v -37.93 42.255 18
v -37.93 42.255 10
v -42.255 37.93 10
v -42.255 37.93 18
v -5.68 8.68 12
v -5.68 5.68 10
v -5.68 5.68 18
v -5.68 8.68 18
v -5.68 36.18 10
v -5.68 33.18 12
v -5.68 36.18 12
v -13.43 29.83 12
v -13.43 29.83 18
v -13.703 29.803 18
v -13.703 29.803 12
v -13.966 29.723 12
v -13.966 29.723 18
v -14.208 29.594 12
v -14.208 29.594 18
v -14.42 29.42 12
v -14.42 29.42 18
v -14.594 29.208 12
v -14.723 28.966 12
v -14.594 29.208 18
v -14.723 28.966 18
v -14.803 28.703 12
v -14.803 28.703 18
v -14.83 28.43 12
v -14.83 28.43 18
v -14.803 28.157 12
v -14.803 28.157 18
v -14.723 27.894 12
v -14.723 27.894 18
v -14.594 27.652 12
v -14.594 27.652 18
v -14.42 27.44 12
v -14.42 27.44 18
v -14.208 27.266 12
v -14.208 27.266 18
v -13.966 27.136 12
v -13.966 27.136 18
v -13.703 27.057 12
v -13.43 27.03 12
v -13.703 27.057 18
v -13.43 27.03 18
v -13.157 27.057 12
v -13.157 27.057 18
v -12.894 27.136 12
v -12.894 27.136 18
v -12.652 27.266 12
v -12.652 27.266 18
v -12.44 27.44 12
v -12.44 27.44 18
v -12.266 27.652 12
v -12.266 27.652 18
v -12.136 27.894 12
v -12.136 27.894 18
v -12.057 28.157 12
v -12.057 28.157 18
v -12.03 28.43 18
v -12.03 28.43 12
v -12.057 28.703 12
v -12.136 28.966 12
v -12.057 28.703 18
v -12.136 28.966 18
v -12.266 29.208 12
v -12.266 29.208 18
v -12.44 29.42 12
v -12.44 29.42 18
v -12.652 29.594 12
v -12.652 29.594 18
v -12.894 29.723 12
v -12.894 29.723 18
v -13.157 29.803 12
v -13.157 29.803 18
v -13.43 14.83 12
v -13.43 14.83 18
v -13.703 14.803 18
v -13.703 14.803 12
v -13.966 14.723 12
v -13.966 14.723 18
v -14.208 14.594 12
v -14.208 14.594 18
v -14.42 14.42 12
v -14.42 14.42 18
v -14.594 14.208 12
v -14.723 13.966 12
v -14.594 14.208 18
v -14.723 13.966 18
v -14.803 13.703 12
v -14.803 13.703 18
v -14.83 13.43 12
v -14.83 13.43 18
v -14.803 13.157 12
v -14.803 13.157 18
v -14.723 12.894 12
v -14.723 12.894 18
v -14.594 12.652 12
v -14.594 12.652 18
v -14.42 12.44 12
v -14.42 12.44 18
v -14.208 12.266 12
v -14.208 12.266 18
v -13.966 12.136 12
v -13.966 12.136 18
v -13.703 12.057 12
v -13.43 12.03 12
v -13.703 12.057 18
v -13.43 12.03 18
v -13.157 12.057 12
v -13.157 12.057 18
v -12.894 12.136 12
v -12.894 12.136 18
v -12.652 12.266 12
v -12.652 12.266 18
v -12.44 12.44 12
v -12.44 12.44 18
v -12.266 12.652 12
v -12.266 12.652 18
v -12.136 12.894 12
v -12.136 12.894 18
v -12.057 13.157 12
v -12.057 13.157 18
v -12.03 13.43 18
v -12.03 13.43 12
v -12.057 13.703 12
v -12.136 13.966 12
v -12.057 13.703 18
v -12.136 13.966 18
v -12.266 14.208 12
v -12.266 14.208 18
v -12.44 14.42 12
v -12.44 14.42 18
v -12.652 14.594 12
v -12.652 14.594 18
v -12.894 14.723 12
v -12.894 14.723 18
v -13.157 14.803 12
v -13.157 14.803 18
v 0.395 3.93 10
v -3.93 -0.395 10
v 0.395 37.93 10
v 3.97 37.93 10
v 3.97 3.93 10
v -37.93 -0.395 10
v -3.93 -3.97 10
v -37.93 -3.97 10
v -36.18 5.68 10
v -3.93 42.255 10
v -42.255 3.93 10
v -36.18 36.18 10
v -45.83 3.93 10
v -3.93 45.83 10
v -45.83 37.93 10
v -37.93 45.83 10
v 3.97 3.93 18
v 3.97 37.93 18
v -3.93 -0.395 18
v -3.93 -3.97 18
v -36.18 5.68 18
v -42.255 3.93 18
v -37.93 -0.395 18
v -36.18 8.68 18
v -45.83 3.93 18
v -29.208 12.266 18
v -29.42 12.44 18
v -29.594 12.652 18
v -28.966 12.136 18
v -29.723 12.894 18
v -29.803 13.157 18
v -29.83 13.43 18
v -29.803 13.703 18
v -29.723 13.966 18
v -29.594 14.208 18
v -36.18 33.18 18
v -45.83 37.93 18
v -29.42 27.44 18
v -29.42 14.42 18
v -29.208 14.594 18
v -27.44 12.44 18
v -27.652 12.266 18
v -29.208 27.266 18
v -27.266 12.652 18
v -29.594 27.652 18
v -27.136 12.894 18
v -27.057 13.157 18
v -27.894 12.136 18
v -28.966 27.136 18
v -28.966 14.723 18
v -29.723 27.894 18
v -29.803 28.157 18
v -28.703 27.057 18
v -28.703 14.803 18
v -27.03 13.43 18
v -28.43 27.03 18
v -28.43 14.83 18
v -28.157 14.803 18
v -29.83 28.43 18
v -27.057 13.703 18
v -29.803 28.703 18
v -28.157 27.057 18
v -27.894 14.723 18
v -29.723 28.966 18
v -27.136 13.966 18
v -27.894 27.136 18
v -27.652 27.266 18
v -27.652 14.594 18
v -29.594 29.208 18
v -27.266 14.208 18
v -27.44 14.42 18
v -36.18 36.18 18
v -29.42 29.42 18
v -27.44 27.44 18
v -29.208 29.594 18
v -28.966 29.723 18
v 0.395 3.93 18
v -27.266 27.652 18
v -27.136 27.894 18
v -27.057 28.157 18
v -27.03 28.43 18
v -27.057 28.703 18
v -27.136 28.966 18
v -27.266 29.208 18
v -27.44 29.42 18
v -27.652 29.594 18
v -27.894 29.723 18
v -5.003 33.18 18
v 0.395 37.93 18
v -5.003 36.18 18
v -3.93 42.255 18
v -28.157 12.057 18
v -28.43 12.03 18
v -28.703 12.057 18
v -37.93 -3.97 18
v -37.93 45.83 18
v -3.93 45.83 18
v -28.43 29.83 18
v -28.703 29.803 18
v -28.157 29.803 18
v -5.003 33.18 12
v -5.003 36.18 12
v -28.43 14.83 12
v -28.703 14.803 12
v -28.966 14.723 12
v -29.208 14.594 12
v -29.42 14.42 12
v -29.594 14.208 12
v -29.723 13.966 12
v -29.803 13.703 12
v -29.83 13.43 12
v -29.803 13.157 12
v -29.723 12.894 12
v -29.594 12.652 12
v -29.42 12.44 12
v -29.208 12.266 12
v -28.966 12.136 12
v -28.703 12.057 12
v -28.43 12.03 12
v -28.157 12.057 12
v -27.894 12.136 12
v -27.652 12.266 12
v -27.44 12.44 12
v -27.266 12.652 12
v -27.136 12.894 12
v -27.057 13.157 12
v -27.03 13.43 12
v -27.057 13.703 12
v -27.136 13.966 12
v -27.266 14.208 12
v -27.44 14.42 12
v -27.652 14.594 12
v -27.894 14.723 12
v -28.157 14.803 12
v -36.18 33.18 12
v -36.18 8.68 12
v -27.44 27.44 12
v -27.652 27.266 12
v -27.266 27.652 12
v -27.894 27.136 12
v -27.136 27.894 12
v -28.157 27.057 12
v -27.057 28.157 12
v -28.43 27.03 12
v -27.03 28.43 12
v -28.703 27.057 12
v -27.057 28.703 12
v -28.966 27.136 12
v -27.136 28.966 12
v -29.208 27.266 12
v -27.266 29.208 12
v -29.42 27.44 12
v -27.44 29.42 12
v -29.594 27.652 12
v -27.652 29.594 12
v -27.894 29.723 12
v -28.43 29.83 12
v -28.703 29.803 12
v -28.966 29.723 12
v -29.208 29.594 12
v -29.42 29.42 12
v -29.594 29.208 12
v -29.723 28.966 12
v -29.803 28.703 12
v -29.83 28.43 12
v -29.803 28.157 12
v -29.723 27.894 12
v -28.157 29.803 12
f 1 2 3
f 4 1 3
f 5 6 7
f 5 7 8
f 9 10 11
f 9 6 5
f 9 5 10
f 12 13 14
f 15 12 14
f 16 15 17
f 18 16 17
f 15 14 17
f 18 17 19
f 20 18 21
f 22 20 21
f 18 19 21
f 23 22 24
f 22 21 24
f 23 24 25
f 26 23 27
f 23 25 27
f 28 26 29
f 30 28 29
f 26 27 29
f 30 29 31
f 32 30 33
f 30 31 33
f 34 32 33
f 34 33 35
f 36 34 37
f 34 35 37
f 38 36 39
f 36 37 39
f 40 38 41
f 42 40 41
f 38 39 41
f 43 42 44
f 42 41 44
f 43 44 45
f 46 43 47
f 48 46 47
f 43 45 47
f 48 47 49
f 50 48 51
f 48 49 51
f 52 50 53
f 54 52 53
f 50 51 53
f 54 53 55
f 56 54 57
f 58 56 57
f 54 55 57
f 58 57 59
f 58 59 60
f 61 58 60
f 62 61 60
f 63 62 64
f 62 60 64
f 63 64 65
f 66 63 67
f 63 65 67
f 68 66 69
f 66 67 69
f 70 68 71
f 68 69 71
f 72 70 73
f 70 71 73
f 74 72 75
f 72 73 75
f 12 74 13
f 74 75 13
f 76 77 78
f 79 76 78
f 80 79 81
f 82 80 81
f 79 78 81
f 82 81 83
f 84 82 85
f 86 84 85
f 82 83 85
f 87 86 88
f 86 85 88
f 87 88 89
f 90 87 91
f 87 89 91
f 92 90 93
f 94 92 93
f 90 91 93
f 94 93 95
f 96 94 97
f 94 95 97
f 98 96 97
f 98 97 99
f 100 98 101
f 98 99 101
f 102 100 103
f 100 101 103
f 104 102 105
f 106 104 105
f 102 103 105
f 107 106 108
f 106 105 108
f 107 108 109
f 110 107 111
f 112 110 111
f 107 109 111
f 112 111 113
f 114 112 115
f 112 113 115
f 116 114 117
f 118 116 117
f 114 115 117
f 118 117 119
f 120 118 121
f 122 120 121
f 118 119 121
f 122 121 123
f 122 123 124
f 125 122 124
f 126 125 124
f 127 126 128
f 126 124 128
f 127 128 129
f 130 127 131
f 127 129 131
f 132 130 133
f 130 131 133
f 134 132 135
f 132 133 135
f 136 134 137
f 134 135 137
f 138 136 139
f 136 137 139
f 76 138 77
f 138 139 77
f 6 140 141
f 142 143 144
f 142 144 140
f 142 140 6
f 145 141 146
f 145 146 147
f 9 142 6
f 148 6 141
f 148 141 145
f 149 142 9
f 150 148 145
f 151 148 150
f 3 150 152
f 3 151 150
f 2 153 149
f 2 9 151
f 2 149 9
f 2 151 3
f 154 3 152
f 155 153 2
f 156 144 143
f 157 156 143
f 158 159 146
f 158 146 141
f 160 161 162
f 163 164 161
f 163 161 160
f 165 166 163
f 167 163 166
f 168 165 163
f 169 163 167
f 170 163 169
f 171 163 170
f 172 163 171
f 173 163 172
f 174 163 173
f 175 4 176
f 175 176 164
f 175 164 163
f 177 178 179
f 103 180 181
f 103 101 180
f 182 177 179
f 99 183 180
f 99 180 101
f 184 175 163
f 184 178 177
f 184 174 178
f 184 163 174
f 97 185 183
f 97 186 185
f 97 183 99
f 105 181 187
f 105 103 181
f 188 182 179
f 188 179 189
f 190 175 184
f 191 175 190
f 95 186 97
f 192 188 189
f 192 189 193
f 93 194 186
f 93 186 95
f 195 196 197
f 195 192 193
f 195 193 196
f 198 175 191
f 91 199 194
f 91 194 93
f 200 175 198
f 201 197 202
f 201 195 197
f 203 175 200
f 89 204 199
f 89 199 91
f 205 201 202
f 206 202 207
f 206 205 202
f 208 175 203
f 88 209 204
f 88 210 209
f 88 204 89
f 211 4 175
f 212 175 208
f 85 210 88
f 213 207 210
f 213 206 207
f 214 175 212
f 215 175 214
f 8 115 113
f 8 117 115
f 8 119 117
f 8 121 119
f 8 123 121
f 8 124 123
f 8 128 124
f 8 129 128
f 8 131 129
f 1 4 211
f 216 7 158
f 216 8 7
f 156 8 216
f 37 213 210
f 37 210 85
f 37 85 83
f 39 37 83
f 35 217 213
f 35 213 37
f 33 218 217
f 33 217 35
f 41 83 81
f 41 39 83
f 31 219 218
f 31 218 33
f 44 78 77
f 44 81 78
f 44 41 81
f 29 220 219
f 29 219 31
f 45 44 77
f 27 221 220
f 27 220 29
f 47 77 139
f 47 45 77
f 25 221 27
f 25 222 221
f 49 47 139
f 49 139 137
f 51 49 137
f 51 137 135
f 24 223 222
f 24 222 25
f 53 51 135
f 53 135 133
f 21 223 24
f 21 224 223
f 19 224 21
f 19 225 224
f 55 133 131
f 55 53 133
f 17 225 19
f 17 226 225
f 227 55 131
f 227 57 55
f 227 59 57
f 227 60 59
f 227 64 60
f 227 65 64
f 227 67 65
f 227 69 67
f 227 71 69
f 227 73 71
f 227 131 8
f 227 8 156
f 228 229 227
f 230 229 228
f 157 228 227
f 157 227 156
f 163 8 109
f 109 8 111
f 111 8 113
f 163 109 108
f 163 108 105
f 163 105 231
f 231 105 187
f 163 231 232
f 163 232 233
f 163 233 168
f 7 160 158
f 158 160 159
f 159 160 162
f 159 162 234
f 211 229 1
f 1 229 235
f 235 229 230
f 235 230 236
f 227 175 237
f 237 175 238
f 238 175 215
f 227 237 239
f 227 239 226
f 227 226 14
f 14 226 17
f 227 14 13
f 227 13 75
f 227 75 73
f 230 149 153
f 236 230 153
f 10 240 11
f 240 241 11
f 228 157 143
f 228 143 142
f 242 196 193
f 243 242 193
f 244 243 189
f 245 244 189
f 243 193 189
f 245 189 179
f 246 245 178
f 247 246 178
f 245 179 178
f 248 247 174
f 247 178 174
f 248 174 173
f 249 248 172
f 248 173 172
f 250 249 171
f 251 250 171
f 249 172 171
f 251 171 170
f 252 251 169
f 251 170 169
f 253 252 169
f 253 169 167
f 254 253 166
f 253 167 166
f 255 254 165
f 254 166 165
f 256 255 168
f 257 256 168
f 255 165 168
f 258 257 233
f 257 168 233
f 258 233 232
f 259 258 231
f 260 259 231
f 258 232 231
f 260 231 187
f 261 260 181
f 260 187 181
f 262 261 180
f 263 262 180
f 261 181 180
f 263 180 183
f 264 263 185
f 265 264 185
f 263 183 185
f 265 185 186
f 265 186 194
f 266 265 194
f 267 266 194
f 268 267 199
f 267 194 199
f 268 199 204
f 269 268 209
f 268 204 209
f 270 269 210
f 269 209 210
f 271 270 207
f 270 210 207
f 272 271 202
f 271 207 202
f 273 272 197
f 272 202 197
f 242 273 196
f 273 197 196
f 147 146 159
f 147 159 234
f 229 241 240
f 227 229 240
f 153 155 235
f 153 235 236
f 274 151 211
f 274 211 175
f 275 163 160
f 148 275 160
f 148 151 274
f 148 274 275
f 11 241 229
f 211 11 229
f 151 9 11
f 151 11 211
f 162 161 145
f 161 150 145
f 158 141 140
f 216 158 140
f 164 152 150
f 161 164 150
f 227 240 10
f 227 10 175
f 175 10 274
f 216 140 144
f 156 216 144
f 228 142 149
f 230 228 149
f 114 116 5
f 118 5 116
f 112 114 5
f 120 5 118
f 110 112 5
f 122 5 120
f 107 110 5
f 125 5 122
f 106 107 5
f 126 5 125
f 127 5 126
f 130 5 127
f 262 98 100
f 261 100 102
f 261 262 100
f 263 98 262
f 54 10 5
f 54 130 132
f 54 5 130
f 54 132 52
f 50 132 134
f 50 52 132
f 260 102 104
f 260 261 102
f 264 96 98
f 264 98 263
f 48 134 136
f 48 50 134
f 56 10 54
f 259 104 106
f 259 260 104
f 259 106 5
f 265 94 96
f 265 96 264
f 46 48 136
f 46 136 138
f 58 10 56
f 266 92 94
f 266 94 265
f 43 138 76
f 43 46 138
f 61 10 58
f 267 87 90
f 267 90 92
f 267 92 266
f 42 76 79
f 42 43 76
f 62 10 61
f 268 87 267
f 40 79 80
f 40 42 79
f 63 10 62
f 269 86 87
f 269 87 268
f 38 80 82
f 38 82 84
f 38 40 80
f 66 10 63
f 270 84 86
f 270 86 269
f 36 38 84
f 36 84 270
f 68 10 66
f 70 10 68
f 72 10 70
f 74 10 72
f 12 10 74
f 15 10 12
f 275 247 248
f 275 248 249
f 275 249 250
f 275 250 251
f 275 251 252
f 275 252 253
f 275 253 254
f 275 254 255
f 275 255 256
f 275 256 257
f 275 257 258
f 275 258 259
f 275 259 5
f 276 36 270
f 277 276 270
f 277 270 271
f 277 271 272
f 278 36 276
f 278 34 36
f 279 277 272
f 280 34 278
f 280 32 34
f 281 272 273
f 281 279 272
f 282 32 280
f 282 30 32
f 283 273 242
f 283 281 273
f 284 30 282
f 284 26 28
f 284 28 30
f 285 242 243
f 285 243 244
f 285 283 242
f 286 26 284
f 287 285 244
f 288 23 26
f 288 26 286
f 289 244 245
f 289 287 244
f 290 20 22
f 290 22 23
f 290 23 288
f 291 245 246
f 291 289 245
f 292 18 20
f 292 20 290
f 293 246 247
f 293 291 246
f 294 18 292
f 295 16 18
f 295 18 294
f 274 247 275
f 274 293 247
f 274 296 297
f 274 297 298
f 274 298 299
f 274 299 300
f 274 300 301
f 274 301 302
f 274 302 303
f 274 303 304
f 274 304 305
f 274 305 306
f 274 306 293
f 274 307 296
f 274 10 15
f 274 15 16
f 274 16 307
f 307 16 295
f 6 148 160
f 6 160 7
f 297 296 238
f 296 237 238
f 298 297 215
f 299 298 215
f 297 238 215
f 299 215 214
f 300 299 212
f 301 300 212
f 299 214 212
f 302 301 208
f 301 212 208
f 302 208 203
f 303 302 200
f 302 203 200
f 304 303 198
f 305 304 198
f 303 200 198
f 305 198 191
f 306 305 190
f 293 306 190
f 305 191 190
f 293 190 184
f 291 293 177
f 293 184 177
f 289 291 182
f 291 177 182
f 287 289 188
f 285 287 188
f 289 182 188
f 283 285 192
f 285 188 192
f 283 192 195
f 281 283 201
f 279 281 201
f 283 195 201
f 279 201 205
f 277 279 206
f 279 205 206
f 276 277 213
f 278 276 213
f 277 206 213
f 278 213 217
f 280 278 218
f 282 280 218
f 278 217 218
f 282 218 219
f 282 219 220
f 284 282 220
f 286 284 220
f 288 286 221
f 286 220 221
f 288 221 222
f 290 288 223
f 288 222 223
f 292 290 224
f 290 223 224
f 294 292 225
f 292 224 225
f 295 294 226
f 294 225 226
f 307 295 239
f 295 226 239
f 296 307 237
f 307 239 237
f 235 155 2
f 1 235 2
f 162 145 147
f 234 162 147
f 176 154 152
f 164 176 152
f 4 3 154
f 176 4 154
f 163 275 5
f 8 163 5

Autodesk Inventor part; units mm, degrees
ref_plane "YZ Plane" through (0, 0, 0) normal (1, 0, 0) x (0, 1, 0)
ref_plane "XZ Plane" through (0, 0, 0) normal (0, 1, 0) x (-1, 0, 0)
ref_plane "Work Plane1" through (0, 0, 10) normal (0, 0, 1) x (1, 0, 0)
sketch "Sketch1" plane through (0, 0, 10) normal (0, 0, 1) x (1, 0, 0)
  line L0 (-4.0299, -0.3538) -> (-2.2322, 1.4439) construction
  arc A0 (-1.4439, 2.2322) -> (-2.2322, 1.4439) centre (-0.9299, 0.9299) ccw construction
  line L1 (-1.4439, 2.2322) -> (0.3538, 4.0299) construction
  line L2 (-37.8299, 42.2137) -> (-37.8299, 45.8299) construction
  line L3 (-37.8299, 45.8299) -> (-4.0299, 45.8299) construction
  line L4 (-4.0299, 45.8299) -> (-4.0299, 42.2137) construction
  line L5 (-4.0299, 4.0299) -> (0.3538, 4.0299) projected
  circle A1 centre (-20.9299, 20.9299) radius 17.5 construction
  line L6 (-20.9299, 58.9723) -> (17.1124, 20.9299) construction
  line L7 (17.1124, 20.9299) -> (-20.9299, -17.1124) construction
  line L8 (-20.9299, -17.1124) -> (-58.9723, 20.9299) construction
  line L9 (-58.9723, 20.9299) -> (-20.9299, 58.9723) construction
  line L10 (-20.9299, 58.9723) -> (-20.9299, -17.1124) construction
  line L11 (17.1124, 20.9299) -> (-58.9723, 20.9299) construction
  line L12 (-20.9299, 58.9723) -> (32.8701, 58.9723) construction
  line L13 (-43.2198, 43.4299) -> (1.7802, 43.4299) construction
  line L14 (1.7802, 43.4299) -> (1.7802, -1.5701) construction
  line L15 (1.7802, -1.5701) -> (-43.2198, -1.5701) construction
  line L16 (-43.2198, -1.5701) -> (-43.2198, 43.4299) construction
  line L17 (-43.2198, 5.1774) -> (-43.2198, 36.6824)
  line L18 (-43.2198, 36.6824) -> (-36.4723, 43.4299)
  line L19 (-36.4723, 43.4299) -> (-5.3876, 43.4299)
  line L20 (-5.3876, 43.4299) -> (1.7802, 36.2621)
  line L21 (1.7802, 36.2621) -> (1.7802, 5.5977)
  line L22 (1.7802, 5.5977) -> (-5.3876, -1.5701)
  line L23 (-5.3876, -1.5701) -> (-36.4723, -1.5701)
  line L24 (-36.4723, -1.5701) -> (-43.2198, 5.1774)
  line L25 (-4.0299, 42.2137) -> (-37.8299, 42.2137) projected
  line L26 (-4.0299, -0.3538) -> (-4.0299, 4.0299) projected
  line L27 (-43.2198, 43.4299) -> (-10.4667, 10.6769) construction
  line L28 (-8.5595, 8.5517) -> (1.7802, -1.5701) construction
  line L29 (1.7802, 43.4299) -> (-25.699, 15.9507) construction
  line L30 (-30.9728, 10.6769) -> (-43.2198, -1.5701) construction
  point P0 (-37.8299, 4.0299)
  dimension "d18" = 53.8
  dimension "d19" = 45
  dimension "d20" = 53.8
  dimension "d21" = 45
  dimension "d22" = 45
extrude "Extrusion1" add sketch "Sketch1" along normal blind 8
sketch "Sketch3" plane through (0, 0, 10) normal (0, 0, -1) x (-1, 0, 0)
  line L0 (37.8299, -0.4701) -> (37.8299, 4.0299) construction
  line L1 (4.0299, 4.0299) -> (4.0299, -0.4701) construction
  line L2 (37.8299, -0.4701) -> (37.8299, 1.1886) construction
  line L3 (4.0299, -3.9701) -> (4.0299, -0.3538) construction
  line L4 (45.8299, 4.0299) -> (42.2137, 4.0299) construction
  line L5 (-0.3538, 4.0299) -> (-3.9701, 4.0299) construction
  line L6 (-3.9701, 37.8299) -> (-0.3538, 37.8299) construction
  line L7 (4.0299, 42.2137) -> (4.0299, 45.8299) construction
  line L8 (37.8299, 45.8299) -> (37.8299, 42.2137) construction
  line L9 (42.2137, 37.8299) -> (45.8299, 37.8299) construction
  line L10 (37.8299, 37.7299) -> (45.8299, 37.7299)
  line L11 (45.8299, 37.7299) -> (45.8299, 4.1299)
  line L12 (45.8299, 4.1299) -> (37.8299, 4.1299)
  line L13 (37.8299, 4.1299) -> (37.8299, 37.7299)
  line L14 (37.7299, 4.0299) -> (4.1299, 4.0299)
  line L15 (4.1299, 4.0299) -> (4.1299, -3.9701)
  line L16 (4.1299, -3.9701) -> (37.7299, -3.9701)
  line L17 (37.7299, -3.9701) -> (37.7299, 4.0299)
  line L18 (4.0299, 4.1299) -> (-3.9701, 4.1299)
  line L19 (-3.9701, 4.1299) -> (-3.9701, 37.7299)
  line L20 (-3.9701, 37.7299) -> (4.0299, 37.7299)
  line L21 (4.0299, 37.7299) -> (4.0299, 4.1299)
  line L22 (4.1299, 37.8299) -> (37.7299, 37.8299)
  line L23 (37.7299, 37.8299) -> (37.7299, 45.8299)
  line L24 (37.7299, 45.8299) -> (4.1299, 45.8299)
  line L25 (4.1299, 45.8299) -> (4.1299, 37.8299)
  point P0 (0, 0)
  dimension "d23" = 0.1
  dimension "d24" = 0.1
  dimension "d25" = 0.1
  dimension "d26" = 0.1
  dimension "d27" = 0.1
extrude "Extrusion3" add sketch "Sketch3" against normal up to surface (8 mm away)
sketch "Skizze12" plane through (0, 0, 10) normal (0, 0, -1) x (-1, 0, 0)
  line L0 (-0.3124, 4.1299) -> (4.1299, -0.3124) projected
  line L1 (4.1299, -0.3124) -> (4.1299, -3.9701) projected
  line L2 (4.1299, -3.9701) -> (37.7299, -3.9701) construction
  line L3 (37.7299, -3.9701) -> (37.7299, -0.3124) projected
  line L4 (37.7299, -0.3124) -> (42.1723, 4.1299) projected
  line L5 (45.8299, 4.1299) -> (42.1723, 4.1299) projected
  line L6 (45.8299, 37.7299) -> (45.8299, 4.1299) construction
  line L7 (42.1723, 37.7299) -> (45.8299, 37.7299) projected
  line L8 (42.1723, 37.7299) -> (37.7299, 42.1723) projected
  line L9 (37.7299, 42.1723) -> (37.7299, 45.8299) projected
  line L10 (37.7299, 45.8299) -> (4.1299, 45.8299) construction
  line L11 (4.1299, 45.8299) -> (4.1299, 42.1723) projected
  line L12 (4.1299, 42.1723) -> (-0.3124, 37.7299) projected
  line L13 (-3.9701, 37.7299) -> (-0.3124, 37.7299) projected
  line L14 (-3.9701, 4.1299) -> (-3.9701, 37.7299) construction
  line L15 (-0.3124, 4.1299) -> (-3.9701, 4.1299) projected
  line L16 (37.9299, -4.1701) -> (3.9299, -4.1701) construction
  line L17 (3.9299, -4.1701) -> (3.9299, -0.3953)
  line L18 (3.9299, -0.3953) -> (-0.3953, 3.9299)
  line L19 (-0.3953, 3.9299) -> (-4.1701, 3.9299)
  line L20 (-4.1701, 3.9299) -> (-4.1701, 37.9299) construction
  line L21 (-4.1701, 37.9299) -> (-0.3953, 37.9299)
  line L22 (-0.3953, 37.9299) -> (3.9299, 42.2551)
  line L23 (3.9299, 42.2551) -> (3.9299, 46.0299)
  line L24 (3.9299, 46.0299) -> (37.9299, 46.0299) construction
  line L25 (37.9299, 46.0299) -> (37.9299, 42.2551)
  line L26 (37.9299, 42.2551) -> (42.2551, 37.9299)
  line L27 (42.2551, 37.9299) -> (46.0299, 37.9299)
  line L28 (46.0299, 37.9299) -> (46.0299, 3.9299) construction
  line L29 (46.0299, 3.9299) -> (42.2551, 3.9299)
  line L30 (42.2551, 3.9299) -> (37.9299, -0.3953)
  line L31 (37.9299, -0.3953) -> (37.9299, -4.1701)
  line L32 (-3.9701, 37.7299) -> (-3.9701, 37.9299)
  line L33 (37.7299, 45.8299) -> (4.1299, 45.8299) projected
  line L34 (4.1299, 45.8299) -> (3.9299, 45.8299)
  line L35 (37.7299, 45.8299) -> (37.9299, 45.8299)
  line L36 (45.8299, 37.7299) -> (45.8299, 37.9299)
  line L37 (45.8299, 4.1299) -> (45.8299, 3.9299)
  line L38 (37.7299, -3.9701) -> (37.9299, -3.9701)
  line L39 (4.1299, -3.9701) -> (3.9299, -3.9701)
  line L40 (-3.9701, 4.1299) -> (-3.9701, 3.9299)
  point P0 (0, 0)
  dimension "d65" = 0.2
extrude "IM_offset" add sketch "Skizze12" against normal up to surface (8 mm away)
sketch "Sketch15" plane through (0, 0, 10) normal (0, 0, -1) x (-1, 0, 0)
  line L0 (-3.9701, 3.9299) -> (-3.9701, 37.9299) projected
  line L1 (-0.3953, 3.9299) -> (-3.9701, 3.9299) projected
  line L2 (3.9299, -0.3953) -> (-0.3953, 3.9299) projected
  line L3 (3.9299, -3.9701) -> (3.9299, -0.3953) projected
  line L4 (3.9299, -3.9701) -> (37.9299, -3.9701) projected
  line L5 (37.9299, -0.3953) -> (37.9299, -3.9701) projected
  line L6 (42.2551, 3.9299) -> (37.9299, -0.3953) projected
  line L7 (45.8299, 3.9299) -> (42.2551, 3.9299) projected
  line L8 (45.8299, 3.9299) -> (45.8299, 37.9299) projected
  line L9 (45.8299, 37.9299) -> (42.2551, 37.9299) projected
  line L10 (42.2551, 37.9299) -> (37.9299, 42.2551) projected
  line L11 (37.9299, 42.2551) -> (37.9299, 45.8299) projected
  line L12 (37.9299, 45.8299) -> (3.9299, 45.8299) projected
  line L13 (3.9299, 45.8299) -> (3.9299, 42.2551) projected
  line L14 (3.9299, 42.2551) -> (-0.3953, 37.9299) projected
  line L15 (-0.3953, 37.9299) -> (-3.9701, 37.9299) projected
  line L16 (36.1799, 36.1799) -> (5.6799, 36.1799)
  line L17 (5.6799, 36.1799) -> (5.6799, 5.6799)
  line L18 (5.6799, 5.6799) -> (36.1799, 5.6799)
  line L19 (36.1799, 5.6799) -> (36.1799, 36.1799)
  line L20 (36.1799, 36.1799) -> (5.6799, 5.6799) construction
  line L21 (5.6799, 36.1799) -> (36.1799, 5.6799) construction
  point P0 (0, 0)
  point P1 (20.9299, 20.9299)
  dimension "d73" = 30.5
  dimension "d74" = 30.5
extrude "Extrusion13" cut sketch "Sketch15" against normal blind 2 contours L19 L18 L17 L16
sketch "Sketch16" plane through (0, 0, 12) normal (0, 0, -1) x (-1, 0, 0)
  line L0 (5.6799, 36.1799) -> (36.1799, 36.1799) projected
  line L1 (5.6799, 5.6799) -> (5.6799, 36.1799) projected
  line L2 (36.1799, 5.6799) -> (5.6799, 5.6799) projected
  line L3 (36.1799, 36.1799) -> (36.1799, 5.6799) projected
  line L4 (5.6799, 5.6799) -> (5.6799, 36.1799) projected
  line L5 (36.1799, 36.1799) -> (36.1799, 5.6799) projected
  line L6 (5.6799, 5.6799) -> (36.1799, 5.6799)
  line L7 (36.1799, 5.6799) -> (36.1799, 8.6799)
  line L8 (36.1799, 8.6799) -> (5.6799, 8.6799)
  line L9 (5.6799, 8.6799) -> (5.6799, 5.6799)
  line L10 (5.6799, 36.1799) -> (36.1799, 36.1799) projected
  line L11 (36.1799, 36.1799) -> (5.0027, 36.1799)
  line L12 (5.0027, 36.1799) -> (5.0027, 33.1799)
  line L13 (5.0027, 33.1799) -> (36.1799, 33.1799)
  line L14 (36.1799, 33.1799) -> (36.1799, 36.1799)
  point P0 (0, 0)
  dimension "d77" = 3
  dimension "d78" = 3
extrude "Extrusion14" cut sketch "Sketch16" against normal through all contours L0 L3 L13 L1 | L1 L13 L12 L11 | L8 L3 L2 L1
sketch "Sketch17" plane through (0, 0, 12) normal (0, 0, -1) x (-1, 0, 0)
  line L0 (5.6799, 8.6799) -> (36.1799, 8.6799) projected
  line L1 (36.1799, 33.1799) -> (36.1799, 8.6799) projected
  line L2 (36.1799, 33.1799) -> (5.6799, 33.1799) projected
  line L3 (5.6799, 8.6799) -> (5.6799, 33.1799) projected
  line L4 (28.4299, 28.4299) -> (13.4299, 28.4299)
  line L5 (13.4299, 28.4299) -> (13.4299, 13.4299)
  line L6 (13.4299, 13.4299) -> (28.4299, 13.4299)
  line L7 (28.4299, 13.4299) -> (28.4299, 28.4299)
  line L8 (28.4299, 28.4299) -> (13.4299, 13.4299) construction
  line L9 (13.4299, 28.4299) -> (28.4299, 13.4299) construction
  point P0 (0, 0)
  point P1 (20.9299, 20.9299)
  dimension "d81" = 15
  dimension "d82" = 15
hole "Hole1" at (-13.4299, 13.4299, 12) at (-13.4299, 28.4299, 12) at (-28.4299, 28.4299, 12) at (-28.4299, 13.4299, 12) direction (0, 0, 1) diameter 2.8 depth 12 tip angle 118
properties part number "20_Cube_Insert_RaspiCam_v3"
